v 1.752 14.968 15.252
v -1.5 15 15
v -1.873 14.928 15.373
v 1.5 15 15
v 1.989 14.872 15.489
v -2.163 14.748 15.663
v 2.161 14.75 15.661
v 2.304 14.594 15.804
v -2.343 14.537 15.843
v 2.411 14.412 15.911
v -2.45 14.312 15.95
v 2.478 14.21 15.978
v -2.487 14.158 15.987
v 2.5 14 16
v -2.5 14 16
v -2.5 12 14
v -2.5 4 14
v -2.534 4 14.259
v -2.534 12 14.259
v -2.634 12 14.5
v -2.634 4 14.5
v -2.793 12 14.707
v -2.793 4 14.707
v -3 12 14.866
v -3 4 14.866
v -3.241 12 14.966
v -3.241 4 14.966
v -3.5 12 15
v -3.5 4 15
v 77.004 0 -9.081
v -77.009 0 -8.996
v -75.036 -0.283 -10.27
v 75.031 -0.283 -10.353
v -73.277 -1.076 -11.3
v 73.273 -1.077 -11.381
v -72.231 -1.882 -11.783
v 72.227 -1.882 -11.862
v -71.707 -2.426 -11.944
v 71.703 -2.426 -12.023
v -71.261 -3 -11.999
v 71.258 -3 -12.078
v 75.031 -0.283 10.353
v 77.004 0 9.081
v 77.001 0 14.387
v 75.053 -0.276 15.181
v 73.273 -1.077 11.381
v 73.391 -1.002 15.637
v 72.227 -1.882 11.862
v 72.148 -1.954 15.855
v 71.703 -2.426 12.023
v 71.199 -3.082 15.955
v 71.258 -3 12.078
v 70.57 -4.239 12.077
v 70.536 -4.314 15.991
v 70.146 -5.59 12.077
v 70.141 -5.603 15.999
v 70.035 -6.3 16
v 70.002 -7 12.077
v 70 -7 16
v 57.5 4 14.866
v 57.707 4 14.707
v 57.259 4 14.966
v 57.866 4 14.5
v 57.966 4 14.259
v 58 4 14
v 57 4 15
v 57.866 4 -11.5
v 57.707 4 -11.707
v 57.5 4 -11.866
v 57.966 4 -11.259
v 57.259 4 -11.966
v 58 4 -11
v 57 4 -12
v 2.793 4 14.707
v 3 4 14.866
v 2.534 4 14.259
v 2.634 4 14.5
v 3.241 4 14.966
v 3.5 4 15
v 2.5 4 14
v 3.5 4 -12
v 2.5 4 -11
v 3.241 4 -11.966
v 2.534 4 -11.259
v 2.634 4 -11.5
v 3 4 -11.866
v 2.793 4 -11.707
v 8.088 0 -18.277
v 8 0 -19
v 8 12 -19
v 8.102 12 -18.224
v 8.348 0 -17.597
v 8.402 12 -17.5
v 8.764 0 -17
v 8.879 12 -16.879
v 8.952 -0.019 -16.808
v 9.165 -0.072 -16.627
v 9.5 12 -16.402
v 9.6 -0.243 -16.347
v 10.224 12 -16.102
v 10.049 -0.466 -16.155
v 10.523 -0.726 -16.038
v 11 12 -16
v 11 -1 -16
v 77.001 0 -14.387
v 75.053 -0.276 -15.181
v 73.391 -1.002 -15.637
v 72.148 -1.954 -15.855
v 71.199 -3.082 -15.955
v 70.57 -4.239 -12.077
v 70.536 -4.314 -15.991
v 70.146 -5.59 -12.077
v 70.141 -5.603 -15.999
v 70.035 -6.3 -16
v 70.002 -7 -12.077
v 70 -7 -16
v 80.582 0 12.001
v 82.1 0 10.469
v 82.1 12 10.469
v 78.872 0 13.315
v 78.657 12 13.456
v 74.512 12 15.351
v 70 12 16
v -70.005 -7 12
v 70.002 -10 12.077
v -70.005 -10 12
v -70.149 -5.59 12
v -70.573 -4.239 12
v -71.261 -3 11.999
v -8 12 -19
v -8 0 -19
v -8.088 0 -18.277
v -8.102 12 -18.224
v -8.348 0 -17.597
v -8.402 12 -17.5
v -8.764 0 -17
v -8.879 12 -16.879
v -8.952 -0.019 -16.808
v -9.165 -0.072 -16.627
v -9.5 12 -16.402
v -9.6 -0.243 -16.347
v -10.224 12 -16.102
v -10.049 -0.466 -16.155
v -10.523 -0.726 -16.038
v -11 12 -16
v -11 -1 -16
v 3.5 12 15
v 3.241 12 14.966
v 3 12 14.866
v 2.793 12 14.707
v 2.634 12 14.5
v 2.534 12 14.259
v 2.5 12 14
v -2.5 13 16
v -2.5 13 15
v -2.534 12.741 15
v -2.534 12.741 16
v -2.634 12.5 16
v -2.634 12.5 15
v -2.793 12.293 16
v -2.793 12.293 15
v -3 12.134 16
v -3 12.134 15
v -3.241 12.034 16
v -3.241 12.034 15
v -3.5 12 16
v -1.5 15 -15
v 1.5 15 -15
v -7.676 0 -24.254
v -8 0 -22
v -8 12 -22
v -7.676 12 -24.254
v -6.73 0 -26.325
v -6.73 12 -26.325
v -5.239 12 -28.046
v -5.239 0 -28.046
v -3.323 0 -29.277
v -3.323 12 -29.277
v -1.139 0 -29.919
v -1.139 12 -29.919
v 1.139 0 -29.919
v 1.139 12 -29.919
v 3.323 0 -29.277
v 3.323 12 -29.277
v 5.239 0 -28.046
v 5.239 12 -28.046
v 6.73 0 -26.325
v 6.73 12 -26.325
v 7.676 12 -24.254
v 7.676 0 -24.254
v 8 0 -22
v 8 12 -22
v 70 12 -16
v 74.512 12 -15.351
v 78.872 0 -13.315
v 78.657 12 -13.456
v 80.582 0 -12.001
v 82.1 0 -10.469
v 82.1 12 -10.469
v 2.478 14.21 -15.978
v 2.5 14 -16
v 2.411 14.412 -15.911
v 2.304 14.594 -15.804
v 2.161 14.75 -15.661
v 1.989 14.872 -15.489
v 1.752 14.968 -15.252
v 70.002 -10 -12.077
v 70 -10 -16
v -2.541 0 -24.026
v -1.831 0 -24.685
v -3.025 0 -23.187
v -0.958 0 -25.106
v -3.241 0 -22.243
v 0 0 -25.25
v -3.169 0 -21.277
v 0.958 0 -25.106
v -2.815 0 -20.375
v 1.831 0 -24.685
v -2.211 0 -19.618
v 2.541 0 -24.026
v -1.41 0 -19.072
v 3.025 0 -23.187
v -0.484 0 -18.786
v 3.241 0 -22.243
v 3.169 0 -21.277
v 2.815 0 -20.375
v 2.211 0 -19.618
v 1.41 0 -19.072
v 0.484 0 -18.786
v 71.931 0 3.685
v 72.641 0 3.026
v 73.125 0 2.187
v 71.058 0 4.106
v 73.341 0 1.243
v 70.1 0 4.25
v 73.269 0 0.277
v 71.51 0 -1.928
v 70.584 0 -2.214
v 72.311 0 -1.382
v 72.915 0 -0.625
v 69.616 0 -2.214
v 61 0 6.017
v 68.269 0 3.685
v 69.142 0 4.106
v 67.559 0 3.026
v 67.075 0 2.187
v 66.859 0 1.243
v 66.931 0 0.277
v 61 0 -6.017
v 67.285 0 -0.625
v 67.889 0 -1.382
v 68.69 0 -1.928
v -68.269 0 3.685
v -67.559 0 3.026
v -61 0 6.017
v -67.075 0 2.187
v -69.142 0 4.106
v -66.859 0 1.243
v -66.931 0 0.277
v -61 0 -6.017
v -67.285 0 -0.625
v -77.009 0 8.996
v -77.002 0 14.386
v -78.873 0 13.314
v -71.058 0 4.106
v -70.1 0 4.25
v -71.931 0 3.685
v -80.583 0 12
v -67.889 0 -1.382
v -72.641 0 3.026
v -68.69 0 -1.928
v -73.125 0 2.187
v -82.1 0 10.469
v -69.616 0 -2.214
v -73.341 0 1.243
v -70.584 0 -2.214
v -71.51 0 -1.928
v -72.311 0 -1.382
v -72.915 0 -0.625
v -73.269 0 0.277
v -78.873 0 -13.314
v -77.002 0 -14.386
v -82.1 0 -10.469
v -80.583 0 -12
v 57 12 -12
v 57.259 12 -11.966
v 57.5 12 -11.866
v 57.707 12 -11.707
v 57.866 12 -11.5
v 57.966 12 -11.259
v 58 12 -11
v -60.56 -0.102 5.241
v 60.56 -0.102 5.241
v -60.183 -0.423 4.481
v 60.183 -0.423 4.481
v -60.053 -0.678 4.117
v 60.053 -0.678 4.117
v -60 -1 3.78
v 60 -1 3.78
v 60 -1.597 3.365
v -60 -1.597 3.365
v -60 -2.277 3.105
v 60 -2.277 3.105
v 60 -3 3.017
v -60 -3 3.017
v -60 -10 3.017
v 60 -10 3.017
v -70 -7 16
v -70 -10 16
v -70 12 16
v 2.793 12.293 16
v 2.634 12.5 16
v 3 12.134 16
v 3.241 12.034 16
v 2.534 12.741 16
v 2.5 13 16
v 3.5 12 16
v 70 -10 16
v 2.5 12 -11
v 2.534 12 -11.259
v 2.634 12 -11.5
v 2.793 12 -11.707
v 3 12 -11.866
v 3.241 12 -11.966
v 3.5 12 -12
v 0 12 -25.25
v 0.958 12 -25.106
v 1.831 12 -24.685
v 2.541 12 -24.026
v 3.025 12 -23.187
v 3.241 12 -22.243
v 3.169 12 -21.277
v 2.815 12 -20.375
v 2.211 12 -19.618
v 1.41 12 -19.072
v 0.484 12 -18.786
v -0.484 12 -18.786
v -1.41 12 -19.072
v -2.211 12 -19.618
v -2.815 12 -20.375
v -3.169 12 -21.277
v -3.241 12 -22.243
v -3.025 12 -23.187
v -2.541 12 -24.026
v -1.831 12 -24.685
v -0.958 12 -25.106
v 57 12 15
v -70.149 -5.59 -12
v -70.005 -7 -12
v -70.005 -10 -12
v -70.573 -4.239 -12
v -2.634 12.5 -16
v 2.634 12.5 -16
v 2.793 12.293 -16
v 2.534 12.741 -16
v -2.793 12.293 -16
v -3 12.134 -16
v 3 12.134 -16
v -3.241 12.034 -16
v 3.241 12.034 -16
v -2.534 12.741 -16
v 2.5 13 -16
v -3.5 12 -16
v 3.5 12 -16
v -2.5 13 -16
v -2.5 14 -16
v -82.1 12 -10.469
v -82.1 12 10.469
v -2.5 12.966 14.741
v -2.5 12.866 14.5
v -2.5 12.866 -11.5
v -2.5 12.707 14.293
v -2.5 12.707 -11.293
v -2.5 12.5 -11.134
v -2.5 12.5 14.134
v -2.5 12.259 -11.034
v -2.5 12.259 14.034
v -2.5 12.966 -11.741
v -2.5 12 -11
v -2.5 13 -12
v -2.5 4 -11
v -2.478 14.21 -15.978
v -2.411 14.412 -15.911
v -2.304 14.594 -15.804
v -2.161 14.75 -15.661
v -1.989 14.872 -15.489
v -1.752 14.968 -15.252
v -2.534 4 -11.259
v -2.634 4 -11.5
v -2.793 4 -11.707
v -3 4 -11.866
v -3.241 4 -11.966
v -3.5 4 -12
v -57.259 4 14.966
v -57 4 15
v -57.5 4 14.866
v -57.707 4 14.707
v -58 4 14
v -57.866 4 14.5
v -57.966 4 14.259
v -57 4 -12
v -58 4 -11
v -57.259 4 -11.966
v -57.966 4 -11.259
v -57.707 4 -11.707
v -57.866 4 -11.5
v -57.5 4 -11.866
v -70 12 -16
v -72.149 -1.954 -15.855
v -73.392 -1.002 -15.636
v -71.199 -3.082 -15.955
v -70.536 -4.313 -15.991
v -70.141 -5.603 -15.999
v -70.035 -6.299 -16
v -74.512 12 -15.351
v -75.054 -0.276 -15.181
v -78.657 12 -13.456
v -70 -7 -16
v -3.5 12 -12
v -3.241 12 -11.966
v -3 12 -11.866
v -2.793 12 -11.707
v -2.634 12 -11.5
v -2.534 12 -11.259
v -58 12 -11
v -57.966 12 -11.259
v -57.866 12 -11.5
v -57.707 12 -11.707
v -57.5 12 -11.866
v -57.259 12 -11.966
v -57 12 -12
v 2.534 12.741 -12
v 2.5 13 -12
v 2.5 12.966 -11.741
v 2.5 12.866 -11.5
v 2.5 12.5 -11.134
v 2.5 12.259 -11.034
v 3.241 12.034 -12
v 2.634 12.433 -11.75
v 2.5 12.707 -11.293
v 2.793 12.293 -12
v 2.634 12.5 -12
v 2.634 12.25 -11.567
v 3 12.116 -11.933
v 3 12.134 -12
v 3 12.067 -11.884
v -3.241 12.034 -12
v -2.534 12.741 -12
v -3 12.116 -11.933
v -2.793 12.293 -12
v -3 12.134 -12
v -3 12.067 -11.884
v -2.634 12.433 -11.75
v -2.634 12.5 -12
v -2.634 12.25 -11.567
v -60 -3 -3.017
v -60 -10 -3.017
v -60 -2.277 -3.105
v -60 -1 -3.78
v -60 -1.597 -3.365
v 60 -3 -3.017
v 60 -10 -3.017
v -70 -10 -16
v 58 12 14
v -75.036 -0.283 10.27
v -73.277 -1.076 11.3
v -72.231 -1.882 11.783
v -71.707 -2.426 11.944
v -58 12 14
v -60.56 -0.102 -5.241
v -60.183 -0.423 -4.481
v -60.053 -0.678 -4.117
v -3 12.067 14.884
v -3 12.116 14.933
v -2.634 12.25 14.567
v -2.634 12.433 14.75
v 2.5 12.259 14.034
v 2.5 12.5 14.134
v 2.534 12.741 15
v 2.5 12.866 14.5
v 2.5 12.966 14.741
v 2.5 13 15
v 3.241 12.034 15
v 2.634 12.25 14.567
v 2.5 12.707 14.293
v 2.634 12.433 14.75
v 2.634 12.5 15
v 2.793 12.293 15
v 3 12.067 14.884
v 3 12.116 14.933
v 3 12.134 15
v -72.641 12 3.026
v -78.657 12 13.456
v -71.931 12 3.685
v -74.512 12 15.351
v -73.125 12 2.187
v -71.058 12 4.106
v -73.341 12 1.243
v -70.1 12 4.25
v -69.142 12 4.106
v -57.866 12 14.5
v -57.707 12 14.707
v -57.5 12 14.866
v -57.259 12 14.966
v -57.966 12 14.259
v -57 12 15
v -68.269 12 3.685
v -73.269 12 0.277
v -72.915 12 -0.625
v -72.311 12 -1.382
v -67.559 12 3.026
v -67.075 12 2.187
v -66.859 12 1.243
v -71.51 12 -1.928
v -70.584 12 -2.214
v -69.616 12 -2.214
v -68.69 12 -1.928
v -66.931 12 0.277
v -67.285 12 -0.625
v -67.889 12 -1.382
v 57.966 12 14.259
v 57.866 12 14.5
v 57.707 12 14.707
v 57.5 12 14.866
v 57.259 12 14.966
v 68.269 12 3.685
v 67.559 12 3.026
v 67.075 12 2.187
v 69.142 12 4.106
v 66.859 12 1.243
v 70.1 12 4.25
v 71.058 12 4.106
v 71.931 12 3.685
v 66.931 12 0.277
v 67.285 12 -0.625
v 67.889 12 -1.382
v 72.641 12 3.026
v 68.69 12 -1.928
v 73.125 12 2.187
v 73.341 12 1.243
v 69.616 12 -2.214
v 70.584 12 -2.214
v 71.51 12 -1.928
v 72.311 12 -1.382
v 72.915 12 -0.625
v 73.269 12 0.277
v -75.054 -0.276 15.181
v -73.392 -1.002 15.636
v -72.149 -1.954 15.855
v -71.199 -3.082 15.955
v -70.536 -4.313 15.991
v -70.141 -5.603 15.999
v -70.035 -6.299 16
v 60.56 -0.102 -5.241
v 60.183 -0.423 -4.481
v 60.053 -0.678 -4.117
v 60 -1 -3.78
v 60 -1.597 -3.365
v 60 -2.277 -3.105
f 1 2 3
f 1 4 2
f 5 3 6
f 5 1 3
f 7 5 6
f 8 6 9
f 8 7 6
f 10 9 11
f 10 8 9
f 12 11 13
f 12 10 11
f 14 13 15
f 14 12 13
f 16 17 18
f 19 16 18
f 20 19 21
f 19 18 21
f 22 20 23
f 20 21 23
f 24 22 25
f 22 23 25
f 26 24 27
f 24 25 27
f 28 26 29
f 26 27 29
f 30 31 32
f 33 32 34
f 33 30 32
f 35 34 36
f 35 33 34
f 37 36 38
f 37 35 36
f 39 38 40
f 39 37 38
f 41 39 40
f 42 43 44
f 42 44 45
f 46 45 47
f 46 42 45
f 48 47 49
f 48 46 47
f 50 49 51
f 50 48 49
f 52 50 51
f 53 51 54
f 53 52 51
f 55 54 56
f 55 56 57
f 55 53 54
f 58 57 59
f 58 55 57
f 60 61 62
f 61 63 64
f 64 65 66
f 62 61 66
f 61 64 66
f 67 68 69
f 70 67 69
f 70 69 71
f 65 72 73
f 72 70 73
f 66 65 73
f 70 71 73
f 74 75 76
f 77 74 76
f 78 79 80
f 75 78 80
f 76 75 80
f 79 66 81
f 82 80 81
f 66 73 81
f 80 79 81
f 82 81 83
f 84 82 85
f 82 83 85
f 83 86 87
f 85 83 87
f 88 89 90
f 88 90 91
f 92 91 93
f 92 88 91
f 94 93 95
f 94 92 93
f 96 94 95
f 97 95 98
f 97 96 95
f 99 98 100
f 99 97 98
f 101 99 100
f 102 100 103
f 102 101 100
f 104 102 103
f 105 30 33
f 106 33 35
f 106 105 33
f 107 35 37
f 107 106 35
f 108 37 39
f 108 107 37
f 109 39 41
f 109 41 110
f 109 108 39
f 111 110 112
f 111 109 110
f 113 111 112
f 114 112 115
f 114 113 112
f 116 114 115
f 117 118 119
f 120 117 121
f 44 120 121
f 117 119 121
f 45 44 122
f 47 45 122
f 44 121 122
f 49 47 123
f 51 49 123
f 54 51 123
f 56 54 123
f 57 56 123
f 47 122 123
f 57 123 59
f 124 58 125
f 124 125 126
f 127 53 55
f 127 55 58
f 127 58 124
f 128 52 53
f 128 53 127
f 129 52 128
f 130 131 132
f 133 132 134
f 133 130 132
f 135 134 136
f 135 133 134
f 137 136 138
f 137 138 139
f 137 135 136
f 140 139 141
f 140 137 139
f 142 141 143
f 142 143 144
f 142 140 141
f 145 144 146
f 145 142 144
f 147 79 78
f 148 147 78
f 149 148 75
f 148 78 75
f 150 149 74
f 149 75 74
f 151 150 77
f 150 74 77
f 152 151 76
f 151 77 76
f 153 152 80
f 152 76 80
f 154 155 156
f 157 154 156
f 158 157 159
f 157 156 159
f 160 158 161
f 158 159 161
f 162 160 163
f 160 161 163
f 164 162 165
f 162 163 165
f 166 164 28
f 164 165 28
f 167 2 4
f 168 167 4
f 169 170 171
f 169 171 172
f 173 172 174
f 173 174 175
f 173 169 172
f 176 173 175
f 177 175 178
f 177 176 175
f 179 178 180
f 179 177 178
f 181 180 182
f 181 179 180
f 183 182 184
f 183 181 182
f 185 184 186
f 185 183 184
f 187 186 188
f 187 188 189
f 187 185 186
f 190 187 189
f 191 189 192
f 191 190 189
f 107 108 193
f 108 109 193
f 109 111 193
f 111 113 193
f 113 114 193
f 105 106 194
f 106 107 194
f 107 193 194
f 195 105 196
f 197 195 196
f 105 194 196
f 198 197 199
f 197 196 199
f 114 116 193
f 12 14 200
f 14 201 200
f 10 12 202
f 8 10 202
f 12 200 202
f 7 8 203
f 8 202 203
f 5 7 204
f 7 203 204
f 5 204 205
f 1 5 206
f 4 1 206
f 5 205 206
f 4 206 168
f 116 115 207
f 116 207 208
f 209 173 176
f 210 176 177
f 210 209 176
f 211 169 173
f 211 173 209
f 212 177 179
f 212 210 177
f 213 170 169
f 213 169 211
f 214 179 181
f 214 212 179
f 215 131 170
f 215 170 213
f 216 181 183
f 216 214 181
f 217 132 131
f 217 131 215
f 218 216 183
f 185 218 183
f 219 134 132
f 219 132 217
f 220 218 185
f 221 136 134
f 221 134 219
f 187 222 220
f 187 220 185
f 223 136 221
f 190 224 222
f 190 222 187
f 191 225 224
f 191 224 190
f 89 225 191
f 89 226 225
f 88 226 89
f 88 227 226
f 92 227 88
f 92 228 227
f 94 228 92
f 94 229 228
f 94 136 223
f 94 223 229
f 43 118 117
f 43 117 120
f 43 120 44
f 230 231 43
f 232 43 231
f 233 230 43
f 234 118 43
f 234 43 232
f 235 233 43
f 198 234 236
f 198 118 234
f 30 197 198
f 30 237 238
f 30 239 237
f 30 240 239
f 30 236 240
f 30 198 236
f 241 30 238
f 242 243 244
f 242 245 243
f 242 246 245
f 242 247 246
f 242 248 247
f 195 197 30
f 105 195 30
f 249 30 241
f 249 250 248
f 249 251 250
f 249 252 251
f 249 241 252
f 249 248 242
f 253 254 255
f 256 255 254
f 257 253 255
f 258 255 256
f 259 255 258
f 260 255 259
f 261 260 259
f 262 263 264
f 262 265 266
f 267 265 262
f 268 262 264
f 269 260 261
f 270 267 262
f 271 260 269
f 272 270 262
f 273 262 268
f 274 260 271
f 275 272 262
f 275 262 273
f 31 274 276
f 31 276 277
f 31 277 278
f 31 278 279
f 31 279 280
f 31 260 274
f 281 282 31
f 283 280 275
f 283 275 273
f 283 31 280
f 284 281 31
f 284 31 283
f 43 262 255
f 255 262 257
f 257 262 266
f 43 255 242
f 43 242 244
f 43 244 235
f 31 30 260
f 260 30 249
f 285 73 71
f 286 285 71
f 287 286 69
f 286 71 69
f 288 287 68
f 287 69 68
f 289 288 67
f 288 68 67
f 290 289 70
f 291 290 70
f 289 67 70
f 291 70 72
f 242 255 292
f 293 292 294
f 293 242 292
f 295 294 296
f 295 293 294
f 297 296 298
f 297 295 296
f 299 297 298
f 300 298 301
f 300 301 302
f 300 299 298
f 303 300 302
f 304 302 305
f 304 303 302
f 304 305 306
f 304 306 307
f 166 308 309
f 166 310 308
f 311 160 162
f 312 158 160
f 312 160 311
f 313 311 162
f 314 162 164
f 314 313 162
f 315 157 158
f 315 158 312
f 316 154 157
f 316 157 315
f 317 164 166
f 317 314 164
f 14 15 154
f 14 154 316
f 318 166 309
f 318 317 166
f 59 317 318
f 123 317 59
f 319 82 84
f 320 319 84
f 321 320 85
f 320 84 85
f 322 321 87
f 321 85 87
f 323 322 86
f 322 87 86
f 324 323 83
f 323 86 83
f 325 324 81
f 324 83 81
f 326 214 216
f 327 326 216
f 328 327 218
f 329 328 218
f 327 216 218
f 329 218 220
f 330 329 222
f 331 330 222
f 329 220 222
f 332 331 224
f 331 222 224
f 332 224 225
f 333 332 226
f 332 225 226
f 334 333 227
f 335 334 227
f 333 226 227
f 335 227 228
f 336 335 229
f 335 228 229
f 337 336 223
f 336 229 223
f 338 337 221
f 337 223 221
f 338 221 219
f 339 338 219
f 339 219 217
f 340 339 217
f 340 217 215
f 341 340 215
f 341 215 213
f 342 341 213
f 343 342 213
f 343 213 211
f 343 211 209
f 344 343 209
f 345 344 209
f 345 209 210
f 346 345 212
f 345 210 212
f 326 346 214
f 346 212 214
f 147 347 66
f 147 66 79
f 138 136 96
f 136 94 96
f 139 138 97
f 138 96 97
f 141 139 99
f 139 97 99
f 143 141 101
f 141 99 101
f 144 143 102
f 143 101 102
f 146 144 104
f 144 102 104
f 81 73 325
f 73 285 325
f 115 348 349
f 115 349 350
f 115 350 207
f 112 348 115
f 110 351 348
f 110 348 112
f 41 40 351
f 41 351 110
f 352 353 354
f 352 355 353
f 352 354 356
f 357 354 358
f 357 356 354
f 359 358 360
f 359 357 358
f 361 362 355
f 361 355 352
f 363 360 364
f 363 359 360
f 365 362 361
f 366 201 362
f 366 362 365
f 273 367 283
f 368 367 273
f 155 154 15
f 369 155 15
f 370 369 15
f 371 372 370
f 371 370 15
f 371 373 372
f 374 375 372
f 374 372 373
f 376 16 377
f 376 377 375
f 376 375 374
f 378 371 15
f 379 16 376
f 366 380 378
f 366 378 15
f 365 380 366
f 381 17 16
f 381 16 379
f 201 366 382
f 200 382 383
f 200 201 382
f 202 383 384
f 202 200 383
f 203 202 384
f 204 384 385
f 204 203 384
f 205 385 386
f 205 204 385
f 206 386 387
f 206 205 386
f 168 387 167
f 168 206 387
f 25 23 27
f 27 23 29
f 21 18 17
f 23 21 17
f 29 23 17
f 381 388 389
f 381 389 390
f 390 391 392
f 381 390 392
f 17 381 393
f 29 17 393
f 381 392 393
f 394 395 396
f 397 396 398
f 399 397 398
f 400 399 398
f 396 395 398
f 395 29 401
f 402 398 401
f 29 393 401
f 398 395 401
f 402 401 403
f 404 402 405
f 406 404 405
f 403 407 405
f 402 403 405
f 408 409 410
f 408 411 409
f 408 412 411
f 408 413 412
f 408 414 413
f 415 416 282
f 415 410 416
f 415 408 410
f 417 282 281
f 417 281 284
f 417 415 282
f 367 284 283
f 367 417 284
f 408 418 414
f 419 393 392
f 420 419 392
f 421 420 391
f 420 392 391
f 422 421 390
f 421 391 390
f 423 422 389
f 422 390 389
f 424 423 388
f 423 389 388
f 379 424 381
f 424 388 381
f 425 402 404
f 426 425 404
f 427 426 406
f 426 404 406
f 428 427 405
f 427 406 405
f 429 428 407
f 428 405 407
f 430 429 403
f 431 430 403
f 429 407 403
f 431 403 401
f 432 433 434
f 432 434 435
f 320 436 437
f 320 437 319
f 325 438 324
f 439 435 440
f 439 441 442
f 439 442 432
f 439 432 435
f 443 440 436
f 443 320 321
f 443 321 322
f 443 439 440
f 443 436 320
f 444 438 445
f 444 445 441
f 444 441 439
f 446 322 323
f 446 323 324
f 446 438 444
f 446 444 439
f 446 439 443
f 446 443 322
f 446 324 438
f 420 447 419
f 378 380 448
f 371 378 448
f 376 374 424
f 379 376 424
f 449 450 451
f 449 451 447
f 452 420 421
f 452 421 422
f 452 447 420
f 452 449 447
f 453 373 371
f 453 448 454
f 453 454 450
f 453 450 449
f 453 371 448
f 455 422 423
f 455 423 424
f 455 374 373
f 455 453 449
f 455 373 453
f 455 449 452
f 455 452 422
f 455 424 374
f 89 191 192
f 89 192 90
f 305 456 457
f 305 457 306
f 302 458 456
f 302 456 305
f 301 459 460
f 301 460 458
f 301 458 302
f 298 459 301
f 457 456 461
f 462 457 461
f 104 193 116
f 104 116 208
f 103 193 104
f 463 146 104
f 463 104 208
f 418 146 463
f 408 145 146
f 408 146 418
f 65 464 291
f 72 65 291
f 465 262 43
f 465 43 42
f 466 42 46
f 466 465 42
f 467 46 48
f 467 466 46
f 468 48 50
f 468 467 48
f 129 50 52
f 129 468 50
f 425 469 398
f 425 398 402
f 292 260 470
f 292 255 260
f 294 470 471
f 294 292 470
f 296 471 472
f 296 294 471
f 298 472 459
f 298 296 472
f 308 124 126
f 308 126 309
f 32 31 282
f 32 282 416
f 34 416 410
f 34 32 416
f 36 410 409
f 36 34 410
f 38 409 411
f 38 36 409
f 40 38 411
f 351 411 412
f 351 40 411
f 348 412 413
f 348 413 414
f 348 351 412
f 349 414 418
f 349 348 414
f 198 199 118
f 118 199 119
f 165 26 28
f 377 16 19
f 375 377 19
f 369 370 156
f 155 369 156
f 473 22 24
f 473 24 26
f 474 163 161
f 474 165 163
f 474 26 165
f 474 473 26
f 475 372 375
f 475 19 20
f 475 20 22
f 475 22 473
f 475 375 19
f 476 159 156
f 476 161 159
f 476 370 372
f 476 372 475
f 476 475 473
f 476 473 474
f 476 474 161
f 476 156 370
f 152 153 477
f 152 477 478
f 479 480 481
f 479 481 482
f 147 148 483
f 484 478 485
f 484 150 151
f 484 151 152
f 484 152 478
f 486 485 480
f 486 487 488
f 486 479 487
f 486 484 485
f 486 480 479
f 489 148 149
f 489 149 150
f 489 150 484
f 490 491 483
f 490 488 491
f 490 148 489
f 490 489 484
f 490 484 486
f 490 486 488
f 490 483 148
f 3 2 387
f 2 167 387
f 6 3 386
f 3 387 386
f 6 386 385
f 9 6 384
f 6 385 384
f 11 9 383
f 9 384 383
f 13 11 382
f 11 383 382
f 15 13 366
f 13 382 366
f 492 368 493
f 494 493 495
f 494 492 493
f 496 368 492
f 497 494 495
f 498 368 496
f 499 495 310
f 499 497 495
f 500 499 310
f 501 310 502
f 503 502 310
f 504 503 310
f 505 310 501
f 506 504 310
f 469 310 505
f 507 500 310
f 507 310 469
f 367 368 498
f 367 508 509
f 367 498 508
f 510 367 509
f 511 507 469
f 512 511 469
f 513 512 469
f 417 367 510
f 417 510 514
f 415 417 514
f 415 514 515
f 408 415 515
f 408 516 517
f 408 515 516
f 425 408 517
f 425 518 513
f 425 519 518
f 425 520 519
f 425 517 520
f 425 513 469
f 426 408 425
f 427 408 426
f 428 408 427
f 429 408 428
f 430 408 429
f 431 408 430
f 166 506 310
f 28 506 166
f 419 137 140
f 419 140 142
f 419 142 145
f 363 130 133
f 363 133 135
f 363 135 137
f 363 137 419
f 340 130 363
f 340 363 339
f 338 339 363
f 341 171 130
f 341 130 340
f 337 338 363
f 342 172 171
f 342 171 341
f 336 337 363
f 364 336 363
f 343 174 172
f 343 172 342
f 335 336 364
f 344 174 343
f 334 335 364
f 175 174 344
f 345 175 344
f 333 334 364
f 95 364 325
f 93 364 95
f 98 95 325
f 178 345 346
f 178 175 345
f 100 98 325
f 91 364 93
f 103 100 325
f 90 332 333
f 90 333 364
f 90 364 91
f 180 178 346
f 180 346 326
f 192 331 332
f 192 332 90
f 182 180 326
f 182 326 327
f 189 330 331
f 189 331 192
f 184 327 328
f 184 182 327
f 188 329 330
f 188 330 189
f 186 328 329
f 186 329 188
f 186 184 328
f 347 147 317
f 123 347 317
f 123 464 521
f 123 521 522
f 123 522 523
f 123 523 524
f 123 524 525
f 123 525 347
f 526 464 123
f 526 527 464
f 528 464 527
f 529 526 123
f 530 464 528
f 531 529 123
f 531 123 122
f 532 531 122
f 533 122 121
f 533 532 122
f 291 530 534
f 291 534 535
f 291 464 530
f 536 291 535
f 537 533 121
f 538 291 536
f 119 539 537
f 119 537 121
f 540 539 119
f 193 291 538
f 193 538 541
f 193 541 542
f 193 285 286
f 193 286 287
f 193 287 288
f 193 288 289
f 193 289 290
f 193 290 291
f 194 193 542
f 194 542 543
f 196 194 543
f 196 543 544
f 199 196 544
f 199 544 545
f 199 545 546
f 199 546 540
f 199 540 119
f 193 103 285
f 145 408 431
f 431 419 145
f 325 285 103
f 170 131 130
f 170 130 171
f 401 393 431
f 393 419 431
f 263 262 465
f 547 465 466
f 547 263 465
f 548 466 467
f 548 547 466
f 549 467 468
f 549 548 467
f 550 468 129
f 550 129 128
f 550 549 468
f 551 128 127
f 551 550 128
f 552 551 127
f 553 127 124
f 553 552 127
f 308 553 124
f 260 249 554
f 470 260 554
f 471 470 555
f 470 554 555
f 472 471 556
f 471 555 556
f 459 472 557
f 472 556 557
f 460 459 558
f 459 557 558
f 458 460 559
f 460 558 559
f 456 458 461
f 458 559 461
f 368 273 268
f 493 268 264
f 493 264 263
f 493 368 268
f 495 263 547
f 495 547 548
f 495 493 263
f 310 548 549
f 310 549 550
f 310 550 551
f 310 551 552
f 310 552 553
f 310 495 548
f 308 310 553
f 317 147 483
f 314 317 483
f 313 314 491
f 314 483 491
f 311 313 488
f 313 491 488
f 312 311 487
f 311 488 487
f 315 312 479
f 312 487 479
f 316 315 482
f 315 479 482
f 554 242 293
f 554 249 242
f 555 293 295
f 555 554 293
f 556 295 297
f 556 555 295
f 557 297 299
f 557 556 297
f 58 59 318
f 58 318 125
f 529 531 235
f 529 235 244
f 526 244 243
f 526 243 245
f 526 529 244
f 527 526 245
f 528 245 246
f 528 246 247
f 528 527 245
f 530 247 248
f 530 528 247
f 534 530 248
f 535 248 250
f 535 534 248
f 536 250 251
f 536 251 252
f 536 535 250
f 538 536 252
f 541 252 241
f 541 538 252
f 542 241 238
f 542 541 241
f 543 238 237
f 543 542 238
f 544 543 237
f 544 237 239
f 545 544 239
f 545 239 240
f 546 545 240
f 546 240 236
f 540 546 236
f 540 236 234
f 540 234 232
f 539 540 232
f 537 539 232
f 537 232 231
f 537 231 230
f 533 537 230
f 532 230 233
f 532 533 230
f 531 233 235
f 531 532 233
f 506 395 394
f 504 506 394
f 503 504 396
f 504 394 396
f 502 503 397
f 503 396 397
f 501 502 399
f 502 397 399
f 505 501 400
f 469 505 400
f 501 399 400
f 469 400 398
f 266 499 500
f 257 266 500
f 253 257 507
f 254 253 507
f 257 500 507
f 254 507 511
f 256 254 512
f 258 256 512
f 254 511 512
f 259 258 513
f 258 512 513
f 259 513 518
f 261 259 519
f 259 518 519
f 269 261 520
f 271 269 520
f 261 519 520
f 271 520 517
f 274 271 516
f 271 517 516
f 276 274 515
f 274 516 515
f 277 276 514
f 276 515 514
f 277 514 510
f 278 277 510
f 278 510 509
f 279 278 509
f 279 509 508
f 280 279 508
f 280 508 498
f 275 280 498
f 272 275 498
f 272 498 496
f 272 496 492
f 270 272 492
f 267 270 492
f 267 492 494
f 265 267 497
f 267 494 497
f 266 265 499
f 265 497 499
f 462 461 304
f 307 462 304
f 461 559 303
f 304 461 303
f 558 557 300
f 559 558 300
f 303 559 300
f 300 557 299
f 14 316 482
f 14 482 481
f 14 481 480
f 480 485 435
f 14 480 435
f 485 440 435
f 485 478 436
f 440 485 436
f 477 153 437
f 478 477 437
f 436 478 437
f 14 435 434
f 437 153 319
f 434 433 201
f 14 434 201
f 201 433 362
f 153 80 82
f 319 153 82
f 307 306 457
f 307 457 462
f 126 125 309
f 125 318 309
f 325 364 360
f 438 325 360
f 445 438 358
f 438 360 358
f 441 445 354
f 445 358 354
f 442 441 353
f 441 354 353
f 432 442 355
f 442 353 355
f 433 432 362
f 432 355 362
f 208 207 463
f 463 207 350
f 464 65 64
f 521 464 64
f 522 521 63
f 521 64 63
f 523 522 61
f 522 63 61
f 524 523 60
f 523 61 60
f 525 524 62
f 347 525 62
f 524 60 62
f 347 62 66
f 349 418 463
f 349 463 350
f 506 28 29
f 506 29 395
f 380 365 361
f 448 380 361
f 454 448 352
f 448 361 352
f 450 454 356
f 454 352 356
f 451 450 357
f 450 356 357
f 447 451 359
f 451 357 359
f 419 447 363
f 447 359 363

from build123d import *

# Parameters (mm, degrees)
SKETCH1_W           = 65
SKETCH1_H           = 32
BOSS_EXTRUDE1_DEPTH = 12
SKETCH10_R          = 3.25
BOLT_EXTRUDE_DEPTH  = 12
SKETCH7_W           = 58
SKETCH7_H           = 27
CUT_EXTRUDE5_DEPTH  = 8
SKETCH8_W           = 5
SKETCH8_H           = 32
BOSS_EXTRUDE3_DEPTH = 11
FILLET6_START       = 3
FILLET6_DEPTH       = 9
FILLET6_START_2     = -16
FILLET6_2_DEPTH     = 4
FILLET6_START_3     = 15
FILLET6_3_DEPTH     = 1
FILLET6_4_ANGLE     = 90
FILLET6_5_ANGLE     = 90
FILLET6_6_ANGLE     = 90
FILLET6_7_ANGLE     = 90
FILLET9_R           = 1
SKETCH11_W          = 120
SKETCH11_H          = 6.033066078
BOSS_EXTRUDE4_DEPTH = 10
SKETCH12_R          = 3.25
BOSS_EXTRUDE5_DEPTH = 12
FILLET11_R          = 7
FILLET12_R          = 3
FILLET13_R          = 3
FILLET15_R          = 1
FILLET16_R          = 1


with BuildPart() as part:
    # Sketch1 → Boss-Extrude1 (new body)
    with BuildSketch(Plane(origin=(0, 0, 0), x_dir=(1, 0, 0), z_dir=(0, 1, 0))):
        with Locations((-32.5, 0)):
            Rectangle(SKETCH1_W, SKETCH1_H)
    extrude(amount=BOSS_EXTRUDE1_DEPTH)

    # Sketch10 → bolt extrude (add)
    with BuildSketch(Plane(origin=(0, 12, 0), x_dir=(1, 0, 0), z_dir=(0, 1, 0))):
        with BuildLine():
            Line((-65, 16), (-70, 16))
            ThreePointArc((-70, 16), (-76.652203093, 14.551570156), (-82.1, 10.468524251))
            Line((-82.1, 10.468524251), (-82.1, -10.468524251))
            ThreePointArc((-82.1, -10.468524251), (-76.652203093, -14.551570156), (-70, -16))
            Line((-70, -16), (-65, -16))
            Line((-65, -16), (-65, 16))
        make_face()
        with Locations(Location((-70.1, -1, 0), (0, 0, 270))):
            Circle(SKETCH10_R, mode=Mode.SUBTRACT)
    extrude(amount=-BOLT_EXTRUDE_DEPTH)

    # Sketch7 → Cut-Extrude5 (cut)
    with BuildSketch(Plane(origin=(0, 12, 0), x_dir=(1, 0, 0), z_dir=(0, 1, 0))):
        with Locations((-29, -1.5)):
            Rectangle(SKETCH7_W, SKETCH7_H)
    extrude(amount=-CUT_EXTRUDE5_DEPTH, mode=Mode.SUBTRACT)

    # Mirror1: part across plane


with BuildPart() as part_1:
    add(part.part)
    add(part.part.mirror(Plane(origin=(0, 0, 0), x_dir=(0, 0, 1), z_dir=(1, 0, 0))))

    # Sketch8 → Boss-Extrude3 (add)
    with BuildSketch(Plane(origin=(0, 4, 0), x_dir=(1, 0, 0), z_dir=(0, 1, 0))):
        Rectangle(SKETCH8_W, SKETCH8_H)
    extrude(amount=BOSS_EXTRUDE3_DEPTH)

    # Fillet6: read off the stored shape, not the designer's step
    # Fillet6 outline → Fillet6 (add)
    with BuildSketch(Plane(origin=(0, 0, 0), x_dir=(1, 0, 0), z_dir=(0, 1, 0)).offset(FILLET6_START)):
        with BuildLine():
            Line((-2.5, -15), (-2.5, -14))
            ThreePointArc((-2.5, -14), (-2.792893219, -14.707106781), (-3.5, -15))
            Line((-3.5, -15), (-2.5, -15))
        make_face()
        with BuildLine():
            ThreePointArc((-3.5, 12), (-2.792893219, 11.707106781), (-2.5, 11))
            Line((-2.5, 11), (-2.5, 12))
            Line((-2.5, 12), (-3.5, 12))
        make_face()
        with BuildLine():
            Line((-58, -15), (-57, -15))
            ThreePointArc((-57, -15), (-57.707106781, -14.707106781), (-58, -14))
            Line((-58, -14), (-58, -15))
        make_face()
        with BuildLine():
            ThreePointArc((-58, 11), (-57.707106781, 11.707106781), (-57, 12))
            Line((-57, 12), (-58, 12))
            Line((-58, 12), (-58, 11))
        make_face()
        with BuildLine():
            Line((2.5, -14), (2.5, -15))
            Line((2.5, -15), (3.5, -15))
            ThreePointArc((3.5, -15), (2.792893219, -14.707106781), (2.5, -14))
        make_face()
        with BuildLine():
            Line((3.5, 12), (2.5, 12))
            Line((2.5, 12), (2.5, 11))
            ThreePointArc((2.5, 11), (2.792893219, 11.707106781), (3.5, 12))
        make_face()
        with BuildLine():
            ThreePointArc((58, -14), (57.707106781, -14.707106781), (57, -15))
            Line((57, -15), (58, -15))
            Line((58, -15), (58, -14))
        make_face()
        with BuildLine():
            Line((58, 12), (57, 12))
            ThreePointArc((57, 12), (57.707106781, 11.707106781), (58, 11))
            Line((58, 11), (58, 12))
        make_face()
    extrude(amount=FILLET6_DEPTH)

    # Fillet6 2 outline → Fillet6 2 (add)
    with BuildSketch(Plane.XY.offset(FILLET6_START_2)):
        with BuildLine():
            Line((-2.5, 12), (-2.5, 13))
            ThreePointArc((-2.5, 13), (-2.792893219, 12.292893219), (-3.5, 12))
            Line((-3.5, 12), (-2.5, 12))
        make_face()
        with BuildLine():
            ThreePointArc((3.5, 12), (2.792893219, 12.292893219), (2.5, 13))
            Line((2.5, 13), (2.5, 12))
            Line((2.5, 12), (3.5, 12))
        make_face()
    extrude(amount=FILLET6_2_DEPTH)

    # Fillet6 3 outline → Fillet6 3 (add)
    with BuildSketch(Plane.XY.offset(FILLET6_START_3)):
        with BuildLine():
            Line((-2.5, 12), (-2.5, 13))
            ThreePointArc((-2.5, 13), (-2.792893219, 12.292893219), (-3.5, 12))
            Line((-3.5, 12), (-2.5, 12))
        make_face()
        with BuildLine():
            ThreePointArc((3.5, 12), (2.792893219, 12.292893219), (2.5, 13))
            Line((2.5, 13), (2.5, 12))
            Line((2.5, 12), (3.5, 12))
        make_face()
    extrude(amount=FILLET6_3_DEPTH)

    # Fillet6 4 outline → Fillet6 4 (revolve)
    with BuildSketch(Plane(origin=(0, 12, 15), x_dir=(0, 0, -1), z_dir=(0, -1, 0))):
        with BuildLine():
            ThreePointArc((0, -3.5), (0.292893219, -2.792893219), (1, -2.5))
            Line((1, -2.5), (0, -2.5))
            Line((0, -2.5), (0, -3.5))
        make_face()
    revolve(axis=Axis((0, 12, 15), (1, 0, 0)), revolution_arc=FILLET6_4_ANGLE)

    # Fillet6 5 outline → Fillet6 5 (revolve)
    with BuildSketch(Plane(origin=(0, 12, -12), x_dir=(0, 1, 0), z_dir=(0, 0, -1))):
        with BuildLine():
            ThreePointArc((0, -3.5), (0.292893219, -2.792893219), (1, -2.5))
            Line((1, -2.5), (0, -2.5))
            Line((0, -2.5), (0, -3.5))
        make_face()
    revolve(axis=Axis((0, 12, -12), (1, 0, 0)), revolution_arc=FILLET6_5_ANGLE)

    # Fillet6 6 outline → Fillet6 6 (revolve)
    with BuildSketch(Plane(origin=(0, 12, -12), x_dir=(0, 1, 0), z_dir=(0, 0, -1))):
        with BuildLine():
            Line((0, 2.5), (1, 2.5))
            ThreePointArc((1, 2.5), (0.292893219, 2.792893219), (0, 3.5))
            Line((0, 3.5), (0, 2.5))
        make_face()
    revolve(axis=Axis((0, 12, -12), (1, 0, 0)), revolution_arc=FILLET6_6_ANGLE)

    # Fillet6 7 outline → Fillet6 7 (revolve)
    with BuildSketch(Plane(origin=(0, 12, 15), x_dir=(0, 0, -1), z_dir=(0, -1, 0))):
        with BuildLine():
            Line((0, 2.5), (1, 2.5))
            ThreePointArc((1, 2.5), (0.292893219, 2.792893219), (0, 3.5))
            Line((0, 3.5), (0, 2.5))
        make_face()
    revolve(axis=Axis((0, 12, 15), (1, 0, 0)), revolution_arc=FILLET6_7_ANGLE)

    # Fillet9
    fillet9_edges = [part_1.edges().sort_by_distance(p)[0] for p in [
        (2.5, 15, 0),
        (0, 15, -16),
        (-2.5, 15, 0),
        (0, 15, 16),
    ]]
    fillet(fillet9_edges, radius=FILLET9_R)

    # Sketch11 → Boss-Extrude4 (add)
    with BuildSketch(Plane.XZ):
        Polygon((70.002161454, 12.077158354), (-70.005398194, 12), (-70, 16), (70, 16), align=None)
        Rectangle(SKETCH11_W, SKETCH11_H)
        Polygon((70.002161454, -12.077158354), (70, -16), (-70, -16), (-70.005398194, -12), align=None)
    extrude(amount=BOSS_EXTRUDE4_DEPTH)

    # Sketch12 → Boss-Extrude5 (add)
    with BuildSketch(Plane.XZ):
        with BuildLine():
            Line((-8, -12), (-8, -22))
            ThreePointArc((-8, -22), (0, -30), (8, -22))
            Line((8, -22), (8, -12))
            Line((8, -12), (-8, -12))
        make_face()
        with Locations(Location((0, -22, 0), (0, 0, 270))):
            Circle(SKETCH12_R, mode=Mode.SUBTRACT)
    extrude(amount=-BOSS_EXTRUDE5_DEPTH)

    # Fillet11
    fillet11_edges = [part_1.edges().sort_by_distance(p)[0] for p in [
        (-70.002699097, 0, -14),
        (70.001080727, 0, -14.038579177),
        (-70.002699097, 0, 14),
        (70.001080727, 0, 14.038579177),
    ]]
    fillet(fillet11_edges, radius=FILLET11_R)

    # Fillet12
    fillet12_edges = [part_1.edges().sort_by_distance(p)[0] for p in [
        (0, 0, 3.016533039),
        (0, 0, -3.016533039),
        (-0.001624692, 0, 12.038579173),
        (-0.001624692, 0, -12.038579173),
    ]]
    fillet(fillet12_edges, radius=FILLET12_R)

    # Fillet13
    fillet13_edges = [part_1.edges().sort_by_distance(p)[0] for p in [
        (-8, 6, -16),
        (8, 6, -16),
    ]]
    fillet(fillet13_edges, radius=FILLET13_R)

    # Fillet15
    fillet15_edges = [part_1.edges().sort_by_distance(p)[0] for p in [
        (0, 0, -16),
    ]]
    fillet(fillet15_edges, radius=FILLET15_R)

    # Fillet16
    fillet16_edges = [part_1.edges().sort_by_distance(p)[0] for p in [
        (60, 0, 0),
        (-60, 0, 0),
    ]]
    fillet(fillet16_edges, radius=FILLET16_R)


solid = part_1.part
